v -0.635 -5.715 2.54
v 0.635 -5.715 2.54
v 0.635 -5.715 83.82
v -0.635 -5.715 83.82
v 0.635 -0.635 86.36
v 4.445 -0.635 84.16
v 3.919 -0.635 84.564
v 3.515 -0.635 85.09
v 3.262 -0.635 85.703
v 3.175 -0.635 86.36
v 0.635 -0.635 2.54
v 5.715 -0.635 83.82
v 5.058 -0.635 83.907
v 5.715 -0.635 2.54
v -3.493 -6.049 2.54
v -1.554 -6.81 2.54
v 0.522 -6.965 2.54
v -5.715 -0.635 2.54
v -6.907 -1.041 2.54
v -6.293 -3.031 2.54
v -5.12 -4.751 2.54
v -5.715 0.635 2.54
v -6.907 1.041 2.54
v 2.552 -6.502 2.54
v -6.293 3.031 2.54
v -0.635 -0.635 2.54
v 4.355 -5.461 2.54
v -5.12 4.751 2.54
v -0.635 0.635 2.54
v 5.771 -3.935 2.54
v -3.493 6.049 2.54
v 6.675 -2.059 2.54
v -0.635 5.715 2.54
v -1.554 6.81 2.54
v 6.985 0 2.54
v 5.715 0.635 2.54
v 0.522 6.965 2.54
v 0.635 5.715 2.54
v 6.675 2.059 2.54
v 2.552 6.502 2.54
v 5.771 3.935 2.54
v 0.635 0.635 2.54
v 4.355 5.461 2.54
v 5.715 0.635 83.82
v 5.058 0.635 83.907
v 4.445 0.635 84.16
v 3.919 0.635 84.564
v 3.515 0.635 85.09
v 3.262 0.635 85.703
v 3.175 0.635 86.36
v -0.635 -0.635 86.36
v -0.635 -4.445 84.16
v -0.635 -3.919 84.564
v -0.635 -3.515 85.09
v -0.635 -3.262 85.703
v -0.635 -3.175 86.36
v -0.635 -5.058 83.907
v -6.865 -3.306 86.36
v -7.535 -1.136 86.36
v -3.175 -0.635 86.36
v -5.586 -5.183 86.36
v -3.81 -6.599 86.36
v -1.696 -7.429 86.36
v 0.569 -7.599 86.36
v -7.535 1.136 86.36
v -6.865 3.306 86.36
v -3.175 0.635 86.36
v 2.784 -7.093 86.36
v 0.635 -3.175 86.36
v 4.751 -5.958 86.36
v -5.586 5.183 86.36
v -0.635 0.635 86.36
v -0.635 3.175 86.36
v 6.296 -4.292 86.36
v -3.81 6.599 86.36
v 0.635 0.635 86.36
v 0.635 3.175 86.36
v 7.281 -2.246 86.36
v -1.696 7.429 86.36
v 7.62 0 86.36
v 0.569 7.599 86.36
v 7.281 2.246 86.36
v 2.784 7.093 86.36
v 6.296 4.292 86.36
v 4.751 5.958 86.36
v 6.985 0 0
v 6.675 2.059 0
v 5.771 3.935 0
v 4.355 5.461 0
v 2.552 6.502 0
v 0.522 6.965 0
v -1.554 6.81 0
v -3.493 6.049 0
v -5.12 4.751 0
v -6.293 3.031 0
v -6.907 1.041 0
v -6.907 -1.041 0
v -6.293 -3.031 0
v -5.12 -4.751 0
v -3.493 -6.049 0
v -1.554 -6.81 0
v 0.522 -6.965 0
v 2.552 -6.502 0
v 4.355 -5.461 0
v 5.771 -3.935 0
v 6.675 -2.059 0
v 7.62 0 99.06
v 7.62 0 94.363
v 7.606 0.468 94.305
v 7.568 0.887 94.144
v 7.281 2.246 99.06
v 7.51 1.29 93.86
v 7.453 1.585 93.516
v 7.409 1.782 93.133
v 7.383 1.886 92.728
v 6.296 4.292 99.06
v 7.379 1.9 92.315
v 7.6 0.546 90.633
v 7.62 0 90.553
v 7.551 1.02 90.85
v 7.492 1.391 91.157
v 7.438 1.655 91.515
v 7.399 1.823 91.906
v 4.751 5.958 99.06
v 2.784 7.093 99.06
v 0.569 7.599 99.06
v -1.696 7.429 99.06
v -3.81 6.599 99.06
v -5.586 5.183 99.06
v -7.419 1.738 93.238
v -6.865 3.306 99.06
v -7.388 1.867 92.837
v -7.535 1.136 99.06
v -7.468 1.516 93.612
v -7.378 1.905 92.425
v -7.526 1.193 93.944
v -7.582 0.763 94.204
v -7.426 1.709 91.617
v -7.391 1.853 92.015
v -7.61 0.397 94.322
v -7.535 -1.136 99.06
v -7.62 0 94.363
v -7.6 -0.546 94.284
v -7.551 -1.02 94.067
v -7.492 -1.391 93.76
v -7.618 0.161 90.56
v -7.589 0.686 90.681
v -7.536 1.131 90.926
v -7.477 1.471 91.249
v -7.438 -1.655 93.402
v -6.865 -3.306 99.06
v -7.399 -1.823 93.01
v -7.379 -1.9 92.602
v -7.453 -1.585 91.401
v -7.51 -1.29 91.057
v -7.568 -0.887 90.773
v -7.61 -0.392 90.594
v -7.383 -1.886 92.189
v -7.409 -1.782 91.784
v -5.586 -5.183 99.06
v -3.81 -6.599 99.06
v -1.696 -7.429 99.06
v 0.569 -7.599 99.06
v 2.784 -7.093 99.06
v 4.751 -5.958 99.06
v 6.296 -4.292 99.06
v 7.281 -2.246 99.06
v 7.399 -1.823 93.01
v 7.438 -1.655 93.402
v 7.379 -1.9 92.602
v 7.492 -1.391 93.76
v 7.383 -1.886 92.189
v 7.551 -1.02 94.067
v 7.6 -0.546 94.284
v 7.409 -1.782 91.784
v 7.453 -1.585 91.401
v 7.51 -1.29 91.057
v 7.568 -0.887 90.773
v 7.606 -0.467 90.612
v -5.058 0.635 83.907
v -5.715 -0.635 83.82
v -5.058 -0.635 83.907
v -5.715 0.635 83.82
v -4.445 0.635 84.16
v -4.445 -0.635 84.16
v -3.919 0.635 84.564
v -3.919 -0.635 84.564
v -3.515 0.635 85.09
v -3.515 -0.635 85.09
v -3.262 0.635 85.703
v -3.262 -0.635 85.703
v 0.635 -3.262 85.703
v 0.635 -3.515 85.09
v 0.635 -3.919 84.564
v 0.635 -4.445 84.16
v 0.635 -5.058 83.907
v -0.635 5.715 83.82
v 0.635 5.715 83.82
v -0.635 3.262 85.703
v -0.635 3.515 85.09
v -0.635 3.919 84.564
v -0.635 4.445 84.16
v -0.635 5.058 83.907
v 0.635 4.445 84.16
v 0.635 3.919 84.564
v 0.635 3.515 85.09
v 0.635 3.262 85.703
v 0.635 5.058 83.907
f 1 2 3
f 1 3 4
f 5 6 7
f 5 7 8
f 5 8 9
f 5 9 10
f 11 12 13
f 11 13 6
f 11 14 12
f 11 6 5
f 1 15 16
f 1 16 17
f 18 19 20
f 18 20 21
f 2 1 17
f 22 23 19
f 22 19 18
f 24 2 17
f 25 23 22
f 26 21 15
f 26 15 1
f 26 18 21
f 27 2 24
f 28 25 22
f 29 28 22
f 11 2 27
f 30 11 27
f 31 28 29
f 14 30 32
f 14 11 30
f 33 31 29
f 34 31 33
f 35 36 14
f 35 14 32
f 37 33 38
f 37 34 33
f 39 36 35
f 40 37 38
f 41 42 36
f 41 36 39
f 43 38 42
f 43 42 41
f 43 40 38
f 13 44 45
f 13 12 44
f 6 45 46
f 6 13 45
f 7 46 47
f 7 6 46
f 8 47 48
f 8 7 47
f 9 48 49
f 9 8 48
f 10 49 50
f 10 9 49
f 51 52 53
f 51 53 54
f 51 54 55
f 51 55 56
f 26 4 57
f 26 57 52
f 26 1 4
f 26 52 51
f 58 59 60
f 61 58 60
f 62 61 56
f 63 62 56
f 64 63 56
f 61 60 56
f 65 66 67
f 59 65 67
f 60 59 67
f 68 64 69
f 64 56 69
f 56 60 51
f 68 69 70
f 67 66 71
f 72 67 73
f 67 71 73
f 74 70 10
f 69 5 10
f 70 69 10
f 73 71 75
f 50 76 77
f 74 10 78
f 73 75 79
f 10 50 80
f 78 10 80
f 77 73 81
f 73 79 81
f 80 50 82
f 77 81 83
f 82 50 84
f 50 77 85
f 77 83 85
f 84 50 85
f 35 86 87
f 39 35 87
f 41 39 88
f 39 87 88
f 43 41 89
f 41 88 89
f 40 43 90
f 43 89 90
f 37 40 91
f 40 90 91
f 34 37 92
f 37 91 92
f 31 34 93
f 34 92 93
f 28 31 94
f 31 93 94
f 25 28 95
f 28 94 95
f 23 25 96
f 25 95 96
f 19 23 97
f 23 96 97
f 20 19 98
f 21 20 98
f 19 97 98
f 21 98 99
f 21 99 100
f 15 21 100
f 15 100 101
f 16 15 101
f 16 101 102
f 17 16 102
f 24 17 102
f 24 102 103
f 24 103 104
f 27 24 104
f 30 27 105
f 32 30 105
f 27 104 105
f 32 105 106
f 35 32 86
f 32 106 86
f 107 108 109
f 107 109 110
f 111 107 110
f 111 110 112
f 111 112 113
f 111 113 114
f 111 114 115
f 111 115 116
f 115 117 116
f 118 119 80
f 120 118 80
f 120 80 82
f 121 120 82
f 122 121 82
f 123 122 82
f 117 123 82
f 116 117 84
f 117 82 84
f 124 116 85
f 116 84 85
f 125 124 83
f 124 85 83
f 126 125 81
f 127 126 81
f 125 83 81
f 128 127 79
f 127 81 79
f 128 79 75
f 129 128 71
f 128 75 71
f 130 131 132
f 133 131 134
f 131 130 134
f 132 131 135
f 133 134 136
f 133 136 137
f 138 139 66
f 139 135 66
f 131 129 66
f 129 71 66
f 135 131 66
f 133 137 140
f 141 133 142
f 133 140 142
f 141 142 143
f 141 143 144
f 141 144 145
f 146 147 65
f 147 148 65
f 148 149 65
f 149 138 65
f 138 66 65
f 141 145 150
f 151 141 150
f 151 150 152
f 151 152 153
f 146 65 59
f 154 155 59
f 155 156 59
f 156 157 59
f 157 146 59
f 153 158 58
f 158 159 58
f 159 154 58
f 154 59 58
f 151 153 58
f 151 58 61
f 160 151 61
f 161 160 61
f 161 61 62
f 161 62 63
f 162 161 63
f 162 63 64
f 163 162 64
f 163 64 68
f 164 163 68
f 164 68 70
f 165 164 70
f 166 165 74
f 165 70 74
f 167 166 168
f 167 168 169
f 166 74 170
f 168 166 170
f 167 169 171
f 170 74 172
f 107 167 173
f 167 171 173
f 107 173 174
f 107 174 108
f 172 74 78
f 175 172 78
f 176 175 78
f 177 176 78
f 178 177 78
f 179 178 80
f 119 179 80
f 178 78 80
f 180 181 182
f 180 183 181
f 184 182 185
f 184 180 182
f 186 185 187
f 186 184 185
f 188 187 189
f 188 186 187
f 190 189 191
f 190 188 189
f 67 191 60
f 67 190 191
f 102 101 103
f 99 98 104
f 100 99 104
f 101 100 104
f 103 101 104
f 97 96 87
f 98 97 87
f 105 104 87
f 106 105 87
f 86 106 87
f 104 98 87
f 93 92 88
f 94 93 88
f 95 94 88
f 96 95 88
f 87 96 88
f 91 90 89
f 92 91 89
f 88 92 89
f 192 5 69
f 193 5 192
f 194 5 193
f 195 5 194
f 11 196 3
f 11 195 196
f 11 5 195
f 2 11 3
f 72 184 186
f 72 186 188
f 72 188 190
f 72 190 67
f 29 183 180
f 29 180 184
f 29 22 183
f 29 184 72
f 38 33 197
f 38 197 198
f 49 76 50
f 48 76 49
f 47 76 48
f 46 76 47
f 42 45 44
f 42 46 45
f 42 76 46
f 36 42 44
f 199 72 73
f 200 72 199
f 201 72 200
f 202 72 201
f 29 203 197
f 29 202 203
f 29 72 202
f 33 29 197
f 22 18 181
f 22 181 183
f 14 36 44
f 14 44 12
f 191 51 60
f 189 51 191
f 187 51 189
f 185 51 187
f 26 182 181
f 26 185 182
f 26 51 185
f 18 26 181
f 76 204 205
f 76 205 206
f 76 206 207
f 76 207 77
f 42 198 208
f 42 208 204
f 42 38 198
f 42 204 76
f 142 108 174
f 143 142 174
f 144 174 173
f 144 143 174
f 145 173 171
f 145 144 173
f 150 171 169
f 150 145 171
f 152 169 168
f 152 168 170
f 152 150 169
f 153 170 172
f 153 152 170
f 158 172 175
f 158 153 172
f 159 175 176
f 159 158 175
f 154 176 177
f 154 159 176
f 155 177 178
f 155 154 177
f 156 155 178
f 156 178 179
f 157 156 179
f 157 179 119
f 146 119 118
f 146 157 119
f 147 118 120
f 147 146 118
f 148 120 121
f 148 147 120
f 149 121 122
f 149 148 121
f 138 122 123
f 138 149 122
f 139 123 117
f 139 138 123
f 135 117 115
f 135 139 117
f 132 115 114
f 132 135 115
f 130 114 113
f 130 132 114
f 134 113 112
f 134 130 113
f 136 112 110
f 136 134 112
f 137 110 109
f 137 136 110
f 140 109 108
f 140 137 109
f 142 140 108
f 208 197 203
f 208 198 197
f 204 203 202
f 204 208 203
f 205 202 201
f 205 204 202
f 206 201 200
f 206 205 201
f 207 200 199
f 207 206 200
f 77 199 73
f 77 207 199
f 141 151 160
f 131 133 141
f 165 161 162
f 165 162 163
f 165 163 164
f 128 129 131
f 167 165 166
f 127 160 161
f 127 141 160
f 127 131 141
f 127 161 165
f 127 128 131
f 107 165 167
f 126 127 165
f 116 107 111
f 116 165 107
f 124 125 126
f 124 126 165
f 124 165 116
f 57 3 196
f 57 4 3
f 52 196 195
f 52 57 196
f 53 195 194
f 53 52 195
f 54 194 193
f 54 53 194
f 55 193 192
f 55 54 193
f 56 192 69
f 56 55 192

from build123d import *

# Parameters (mm, degrees)
SKETCH1_R               = 6.985
BOSS_EXTRUDE1_DEPTH     = 2.54
BOSS_EXTRUDE2_DEPTH     = 81.28
BOSS_EXTRUDE3_DEPTH     = 2.54
FILLET1_R               = 2.54
SKETCH4_R               = 7.62
BOSS_EXTRUDE4_DEPTH     = 12.7
CUT_EXTRUDE1_DEPTH      = 101.243554531
CUT_EXTRUDE1_DEPTH_BACK = 101.243554531
SKETCH5_R               = 1.905


with BuildPart() as part:
    # Sketch1 → Boss-Extrude1 (new body)
    with BuildSketch(Plane.XY):
        Circle(SKETCH1_R)
    extrude(amount=BOSS_EXTRUDE1_DEPTH)

    # Sketch2 → Boss-Extrude2 (add)
    with BuildSketch(Plane.XY.offset(2.54)):
        Polygon((-0.635, -0.635), (-5.715, -0.635), (-5.715, 0.635), (-0.635, 0.635), (-0.635, 5.715), (0.635, 5.715), (0.635, 0.635), (5.715, 0.635), (5.715, -0.635), (0.635, -0.635), (0.635, -5.715), (-0.635, -5.715), align=None)
    extrude(amount=BOSS_EXTRUDE2_DEPTH)

    # Sketch3 → Boss-Extrude3 (add)
    with BuildSketch(Plane.XY.offset(83.82)):
        Polygon((-3.175, 0.635), (-0.635, 0.635), (-0.635, 3.175), (0.635, 3.175), (0.635, 0.635), (3.175, 0.635), (3.175, -0.635), (0.635, -0.635), (0.635, -3.175), (-0.635, -3.175), (-0.635, -0.635), (-3.175, -0.635), align=None)
    extrude(amount=BOSS_EXTRUDE3_DEPTH)

    # Fillet1
    fillet1_edges = [part.edges().sort_by_distance(p)[0] for p in [
        (0, -3.175, 83.82),
        (3.175, 0, 83.82),
        (0, 3.175, 83.82),
        (-3.175, 0, 83.82),
    ]]
    fillet(fillet1_edges, radius=FILLET1_R - 0.0001)  # a hair under: the kernel refuses the full size

    # Sketch4 → Boss-Extrude4 (add)
    with BuildSketch(Plane.XY.offset(86.36)):
        Circle(SKETCH4_R)
    extrude(amount=BOSS_EXTRUDE4_DEPTH)

    # Sketch5 → Cut-Extrude1 (cut, two sides: drawn at the far end of the back side and taken through both)
    with BuildSketch(Plane(origin=(5.715, 0, 0), x_dir=(0, 0, -1), z_dir=(1, 0, 0)).offset(-CUT_EXTRUDE1_DEPTH_BACK)):
        with Locations(Location((-92.458470984, 0, 0), (0, 0, 180.000000004))):
            Circle(SKETCH5_R)
    extrude(amount=CUT_EXTRUDE1_DEPTH + CUT_EXTRUDE1_DEPTH_BACK, mode=Mode.SUBTRACT)


solid = part.part
